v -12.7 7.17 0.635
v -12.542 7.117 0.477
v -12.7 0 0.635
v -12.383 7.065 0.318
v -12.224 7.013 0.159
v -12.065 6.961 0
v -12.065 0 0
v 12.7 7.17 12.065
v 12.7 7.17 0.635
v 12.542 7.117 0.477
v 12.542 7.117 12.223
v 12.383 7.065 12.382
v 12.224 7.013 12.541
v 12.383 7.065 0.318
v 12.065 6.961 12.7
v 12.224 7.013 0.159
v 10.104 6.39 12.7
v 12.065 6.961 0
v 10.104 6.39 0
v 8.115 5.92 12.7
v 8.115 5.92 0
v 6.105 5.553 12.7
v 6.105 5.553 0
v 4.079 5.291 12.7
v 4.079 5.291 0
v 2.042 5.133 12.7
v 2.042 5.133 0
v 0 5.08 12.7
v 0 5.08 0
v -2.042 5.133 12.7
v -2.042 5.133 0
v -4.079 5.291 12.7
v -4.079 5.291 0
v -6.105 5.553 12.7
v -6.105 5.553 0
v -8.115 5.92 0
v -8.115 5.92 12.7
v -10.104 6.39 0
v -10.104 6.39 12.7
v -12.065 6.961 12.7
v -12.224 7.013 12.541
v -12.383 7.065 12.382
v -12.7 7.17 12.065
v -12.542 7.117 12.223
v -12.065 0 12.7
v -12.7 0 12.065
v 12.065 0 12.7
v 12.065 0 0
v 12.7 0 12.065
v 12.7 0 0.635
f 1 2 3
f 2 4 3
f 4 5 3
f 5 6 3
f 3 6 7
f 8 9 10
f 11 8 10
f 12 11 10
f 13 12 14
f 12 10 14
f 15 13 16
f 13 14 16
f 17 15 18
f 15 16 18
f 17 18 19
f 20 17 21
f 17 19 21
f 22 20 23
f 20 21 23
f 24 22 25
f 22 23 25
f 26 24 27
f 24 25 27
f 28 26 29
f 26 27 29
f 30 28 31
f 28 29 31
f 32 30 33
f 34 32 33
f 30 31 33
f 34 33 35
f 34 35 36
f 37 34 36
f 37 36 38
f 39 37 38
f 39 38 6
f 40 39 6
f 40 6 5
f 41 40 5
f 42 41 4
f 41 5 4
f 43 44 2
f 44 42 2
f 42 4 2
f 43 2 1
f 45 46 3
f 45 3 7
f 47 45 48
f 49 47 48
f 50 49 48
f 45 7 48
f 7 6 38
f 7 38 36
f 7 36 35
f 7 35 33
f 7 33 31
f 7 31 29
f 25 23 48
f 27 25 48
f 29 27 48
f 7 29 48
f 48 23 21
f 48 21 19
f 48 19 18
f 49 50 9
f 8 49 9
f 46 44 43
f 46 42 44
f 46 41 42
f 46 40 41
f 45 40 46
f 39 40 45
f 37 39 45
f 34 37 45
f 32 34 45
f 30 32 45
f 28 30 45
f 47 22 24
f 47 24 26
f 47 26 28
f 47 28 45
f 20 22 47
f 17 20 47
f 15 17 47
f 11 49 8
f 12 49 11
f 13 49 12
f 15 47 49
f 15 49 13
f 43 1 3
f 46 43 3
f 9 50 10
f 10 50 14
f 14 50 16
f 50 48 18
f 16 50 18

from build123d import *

# Parameters (mm, degrees)
BOSS_EXTRUDE1_DEPTH = 12.7
CHAMFER1_SIZE       = 0.635


with BuildPart() as part:
    # Sketch1 → Boss-Extrude1 (new body)
    with BuildSketch(Plane.XY):
        with BuildLine():
            Line((-12.7, 7.170396709), (-12.7, 0))
            Line((-12.7, 0), (12.7, 0))
            Line((12.7, 0), (12.7, 7.170396709))
            ThreePointArc((12.7, 7.170396709), (0, 5.08), (-12.7, 7.170396709))
        make_face()
    extrude(amount=BOSS_EXTRUDE1_DEPTH)

    # Chamfer1
    chamfer1_edges = [part.edges().sort_by_distance(p)[0] for p in [
        (12.7, 3.585198355, 12.7),
        (12.7, 3.585198355, 0),
        (-12.7, 3.585198355, 0),
        (-12.7, 3.585198355, 12.7),
    ]]
    chamfer(chamfer1_edges, length=CHAMFER1_SIZE)


solid = part.part
